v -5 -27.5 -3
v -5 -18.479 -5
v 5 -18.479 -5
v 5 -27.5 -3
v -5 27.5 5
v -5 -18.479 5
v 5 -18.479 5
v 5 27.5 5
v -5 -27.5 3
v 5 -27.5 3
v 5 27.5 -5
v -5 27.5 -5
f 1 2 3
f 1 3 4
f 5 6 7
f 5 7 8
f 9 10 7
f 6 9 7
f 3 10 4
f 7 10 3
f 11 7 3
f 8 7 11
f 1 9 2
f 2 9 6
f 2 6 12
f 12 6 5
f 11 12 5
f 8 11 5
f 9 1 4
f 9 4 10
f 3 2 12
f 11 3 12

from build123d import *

# Parameters (mm, degrees)
PLAT_W                       = 55
PLAT_H                       = 10
EL_MENT_M_CANO_SOUD_1_DEPTH  = 10
ENL_V_MAT_EXTRU_1_DEPTH      = 6
ENL_V_MAT_EXTRU_1_DEPTH_BACK = 6


with BuildPart() as part:
    # plat → Elément mécano-soudé1 (new body)
    with BuildSketch(Plane.YZ.offset(-5)):
        Rectangle(PLAT_W, PLAT_H)
    extrude(amount=EL_MENT_M_CANO_SOUD_1_DEPTH)

    # Esquisse2 → Enlèv. mat.-Extru.1 (cut, two sides)
    with BuildSketch(Plane(origin=(0, 0, 0), x_dir=(0, 0, -1), z_dir=(1, 0, 0))) as enl_v_mat_extru_1_sk:
        Polygon((-3, -27.5), (-5, -18.478582993), (-5, -27.5), align=None)
        Polygon((5, -27.5), (5, -18.478582993), (3, -27.5), align=None)
    extrude(amount=ENL_V_MAT_EXTRU_1_DEPTH, mode=Mode.SUBTRACT)
    extrude(enl_v_mat_extru_1_sk.sketch, amount=-ENL_V_MAT_EXTRU_1_DEPTH_BACK, mode=Mode.SUBTRACT)


solid = part.part
